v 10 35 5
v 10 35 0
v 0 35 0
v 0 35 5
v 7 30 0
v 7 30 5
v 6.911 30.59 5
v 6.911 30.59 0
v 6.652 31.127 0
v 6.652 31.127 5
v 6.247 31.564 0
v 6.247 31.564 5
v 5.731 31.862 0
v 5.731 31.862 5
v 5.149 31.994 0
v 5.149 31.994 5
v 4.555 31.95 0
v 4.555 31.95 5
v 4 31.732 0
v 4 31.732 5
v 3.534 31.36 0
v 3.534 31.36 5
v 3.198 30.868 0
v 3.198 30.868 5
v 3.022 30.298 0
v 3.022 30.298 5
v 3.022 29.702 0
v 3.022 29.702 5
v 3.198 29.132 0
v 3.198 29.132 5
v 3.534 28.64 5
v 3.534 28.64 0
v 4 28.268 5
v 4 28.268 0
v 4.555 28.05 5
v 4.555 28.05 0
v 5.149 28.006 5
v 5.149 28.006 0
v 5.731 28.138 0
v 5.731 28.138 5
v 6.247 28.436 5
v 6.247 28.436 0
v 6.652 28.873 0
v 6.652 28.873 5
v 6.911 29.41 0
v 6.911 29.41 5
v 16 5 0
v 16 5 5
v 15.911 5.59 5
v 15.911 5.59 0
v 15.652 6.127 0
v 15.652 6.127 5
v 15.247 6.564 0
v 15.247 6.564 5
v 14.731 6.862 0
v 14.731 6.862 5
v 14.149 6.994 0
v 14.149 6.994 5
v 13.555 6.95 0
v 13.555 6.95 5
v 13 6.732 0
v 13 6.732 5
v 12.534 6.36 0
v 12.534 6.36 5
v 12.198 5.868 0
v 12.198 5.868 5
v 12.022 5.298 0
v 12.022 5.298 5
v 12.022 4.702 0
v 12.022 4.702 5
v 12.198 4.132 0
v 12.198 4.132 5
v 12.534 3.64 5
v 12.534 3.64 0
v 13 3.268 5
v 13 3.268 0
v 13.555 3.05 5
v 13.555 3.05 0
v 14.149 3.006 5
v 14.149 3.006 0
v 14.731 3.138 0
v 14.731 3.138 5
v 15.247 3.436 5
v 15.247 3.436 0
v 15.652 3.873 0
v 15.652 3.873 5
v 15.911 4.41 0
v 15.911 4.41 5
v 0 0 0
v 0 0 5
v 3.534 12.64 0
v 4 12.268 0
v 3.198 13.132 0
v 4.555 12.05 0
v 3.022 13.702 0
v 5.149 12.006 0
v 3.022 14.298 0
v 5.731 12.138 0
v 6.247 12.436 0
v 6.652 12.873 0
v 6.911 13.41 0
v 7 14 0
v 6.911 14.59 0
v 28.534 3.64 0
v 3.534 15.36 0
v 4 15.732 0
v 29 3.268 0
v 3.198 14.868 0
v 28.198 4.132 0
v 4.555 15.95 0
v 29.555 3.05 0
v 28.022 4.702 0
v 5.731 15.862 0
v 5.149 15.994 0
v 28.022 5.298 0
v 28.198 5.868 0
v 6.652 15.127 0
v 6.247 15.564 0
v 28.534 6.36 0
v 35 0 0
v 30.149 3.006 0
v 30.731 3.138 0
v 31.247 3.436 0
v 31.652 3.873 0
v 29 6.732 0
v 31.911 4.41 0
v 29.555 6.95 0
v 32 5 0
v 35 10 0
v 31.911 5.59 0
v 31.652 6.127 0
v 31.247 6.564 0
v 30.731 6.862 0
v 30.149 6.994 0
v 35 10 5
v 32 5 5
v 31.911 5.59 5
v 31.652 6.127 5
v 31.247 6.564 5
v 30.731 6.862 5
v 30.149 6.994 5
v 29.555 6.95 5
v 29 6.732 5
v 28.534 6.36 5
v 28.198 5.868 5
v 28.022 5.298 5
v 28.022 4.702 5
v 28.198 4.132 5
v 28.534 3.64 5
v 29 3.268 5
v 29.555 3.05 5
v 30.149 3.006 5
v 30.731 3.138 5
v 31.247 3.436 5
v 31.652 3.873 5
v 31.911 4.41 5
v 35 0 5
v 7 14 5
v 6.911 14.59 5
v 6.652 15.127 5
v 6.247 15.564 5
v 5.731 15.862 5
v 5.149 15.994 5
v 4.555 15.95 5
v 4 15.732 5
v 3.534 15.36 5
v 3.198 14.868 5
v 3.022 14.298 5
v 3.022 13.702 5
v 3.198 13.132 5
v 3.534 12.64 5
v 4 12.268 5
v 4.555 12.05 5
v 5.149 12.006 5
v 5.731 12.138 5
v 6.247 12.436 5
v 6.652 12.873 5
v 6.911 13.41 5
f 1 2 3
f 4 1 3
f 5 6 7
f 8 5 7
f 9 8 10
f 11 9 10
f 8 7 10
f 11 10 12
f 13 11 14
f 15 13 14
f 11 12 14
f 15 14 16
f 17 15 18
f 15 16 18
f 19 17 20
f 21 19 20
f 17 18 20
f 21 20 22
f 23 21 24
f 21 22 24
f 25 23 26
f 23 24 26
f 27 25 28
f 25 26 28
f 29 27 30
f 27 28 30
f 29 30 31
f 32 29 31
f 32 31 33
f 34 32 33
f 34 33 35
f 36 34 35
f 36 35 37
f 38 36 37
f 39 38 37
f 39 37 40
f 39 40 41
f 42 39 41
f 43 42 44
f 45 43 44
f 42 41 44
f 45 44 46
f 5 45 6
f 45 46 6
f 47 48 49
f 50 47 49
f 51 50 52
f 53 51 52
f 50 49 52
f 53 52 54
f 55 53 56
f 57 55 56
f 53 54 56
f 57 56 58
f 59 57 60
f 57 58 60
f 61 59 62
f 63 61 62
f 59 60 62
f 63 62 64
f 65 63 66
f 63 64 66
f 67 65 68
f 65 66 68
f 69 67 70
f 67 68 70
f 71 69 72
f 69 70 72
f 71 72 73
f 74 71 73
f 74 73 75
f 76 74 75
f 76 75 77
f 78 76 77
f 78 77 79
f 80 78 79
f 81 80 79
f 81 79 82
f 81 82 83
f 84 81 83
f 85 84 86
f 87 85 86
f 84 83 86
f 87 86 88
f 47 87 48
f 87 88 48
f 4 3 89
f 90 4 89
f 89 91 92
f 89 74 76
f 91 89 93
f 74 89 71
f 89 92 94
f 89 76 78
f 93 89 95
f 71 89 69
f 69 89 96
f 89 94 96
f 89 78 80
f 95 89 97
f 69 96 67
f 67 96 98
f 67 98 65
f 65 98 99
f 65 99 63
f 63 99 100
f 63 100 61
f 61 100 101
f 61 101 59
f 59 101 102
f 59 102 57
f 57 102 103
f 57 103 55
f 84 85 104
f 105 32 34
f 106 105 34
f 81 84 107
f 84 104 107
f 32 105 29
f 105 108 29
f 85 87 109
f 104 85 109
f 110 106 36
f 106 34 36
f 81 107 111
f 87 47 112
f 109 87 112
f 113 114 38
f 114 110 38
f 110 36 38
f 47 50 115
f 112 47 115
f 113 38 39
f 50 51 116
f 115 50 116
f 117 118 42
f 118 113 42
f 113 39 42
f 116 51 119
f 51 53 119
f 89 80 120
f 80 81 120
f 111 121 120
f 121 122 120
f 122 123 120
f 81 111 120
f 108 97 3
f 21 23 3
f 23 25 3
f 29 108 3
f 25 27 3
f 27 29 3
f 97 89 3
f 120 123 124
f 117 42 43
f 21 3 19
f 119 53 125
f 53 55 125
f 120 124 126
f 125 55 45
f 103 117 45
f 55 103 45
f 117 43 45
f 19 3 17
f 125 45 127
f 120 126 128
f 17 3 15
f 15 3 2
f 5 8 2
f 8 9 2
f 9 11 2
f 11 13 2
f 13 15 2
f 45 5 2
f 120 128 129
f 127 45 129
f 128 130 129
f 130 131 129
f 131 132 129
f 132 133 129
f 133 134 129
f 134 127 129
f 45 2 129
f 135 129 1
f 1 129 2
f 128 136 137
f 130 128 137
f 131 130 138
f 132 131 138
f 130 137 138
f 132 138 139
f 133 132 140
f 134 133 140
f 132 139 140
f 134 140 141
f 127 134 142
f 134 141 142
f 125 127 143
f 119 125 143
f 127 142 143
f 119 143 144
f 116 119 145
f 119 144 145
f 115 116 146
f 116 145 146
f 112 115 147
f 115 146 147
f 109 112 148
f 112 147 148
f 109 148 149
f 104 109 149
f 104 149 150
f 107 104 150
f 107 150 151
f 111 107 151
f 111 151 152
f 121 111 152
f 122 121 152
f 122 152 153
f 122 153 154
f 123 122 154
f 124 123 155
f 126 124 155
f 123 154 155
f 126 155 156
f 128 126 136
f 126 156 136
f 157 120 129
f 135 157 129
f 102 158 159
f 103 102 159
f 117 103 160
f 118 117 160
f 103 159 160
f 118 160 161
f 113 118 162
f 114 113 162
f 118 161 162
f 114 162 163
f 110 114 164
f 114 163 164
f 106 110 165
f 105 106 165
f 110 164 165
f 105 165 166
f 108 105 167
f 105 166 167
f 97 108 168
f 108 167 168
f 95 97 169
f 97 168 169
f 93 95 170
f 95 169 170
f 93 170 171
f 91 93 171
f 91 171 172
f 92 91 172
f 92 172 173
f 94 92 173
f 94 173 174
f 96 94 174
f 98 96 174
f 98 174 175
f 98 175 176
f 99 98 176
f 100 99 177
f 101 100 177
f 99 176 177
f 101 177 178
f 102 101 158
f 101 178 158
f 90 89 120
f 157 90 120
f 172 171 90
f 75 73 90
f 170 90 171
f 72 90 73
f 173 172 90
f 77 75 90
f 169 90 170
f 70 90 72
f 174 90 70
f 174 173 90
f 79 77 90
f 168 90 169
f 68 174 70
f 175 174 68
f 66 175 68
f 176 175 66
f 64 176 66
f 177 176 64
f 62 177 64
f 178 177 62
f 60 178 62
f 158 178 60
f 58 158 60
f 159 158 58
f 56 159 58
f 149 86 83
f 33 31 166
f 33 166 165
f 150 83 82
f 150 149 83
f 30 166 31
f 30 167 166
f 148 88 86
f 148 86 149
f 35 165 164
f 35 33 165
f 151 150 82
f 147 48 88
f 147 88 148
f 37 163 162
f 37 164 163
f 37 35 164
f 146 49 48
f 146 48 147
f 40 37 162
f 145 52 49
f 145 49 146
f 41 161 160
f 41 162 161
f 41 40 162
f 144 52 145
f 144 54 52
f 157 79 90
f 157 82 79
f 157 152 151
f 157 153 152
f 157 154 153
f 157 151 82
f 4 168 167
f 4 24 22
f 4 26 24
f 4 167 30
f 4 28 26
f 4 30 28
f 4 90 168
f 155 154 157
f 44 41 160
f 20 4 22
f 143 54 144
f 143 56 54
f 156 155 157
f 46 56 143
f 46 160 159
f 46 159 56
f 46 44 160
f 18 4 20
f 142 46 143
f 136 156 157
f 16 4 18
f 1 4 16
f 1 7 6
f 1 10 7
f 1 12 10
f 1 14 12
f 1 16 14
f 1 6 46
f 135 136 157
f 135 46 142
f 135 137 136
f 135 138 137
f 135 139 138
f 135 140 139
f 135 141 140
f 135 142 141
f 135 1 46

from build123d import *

# Parameters (mm, degrees)
BOSS_EXTRU_1_DEPTH      = 5
ESQUISSE2_R             = 2
ENL_V_MAT_EXTRU_1_DEPTH = 5


with BuildPart() as part:
    # Esquisse1 → Boss.-Extru.1 (new body)
    with BuildSketch(Plane.XY):
        Polygon((0, 0), (35, 0), (35, 10), (10, 35), (0, 35), align=None)
    extrude(amount=BOSS_EXTRU_1_DEPTH)

    # Esquisse2 → Enlèv. mat.-Extru.1 (cut)
    with BuildSketch(Plane.XY.offset(5)):
        with Locations((14, 5)):
            Circle(ESQUISSE2_R)
        with Locations((30, 5)):
            Circle(ESQUISSE2_R)
        with Locations((5, 30)):
            Circle(ESQUISSE2_R)
        with Locations((5, 14)):
            Circle(ESQUISSE2_R)
    extrude(amount=-ENL_V_MAT_EXTRU_1_DEPTH, mode=Mode.SUBTRACT)


solid = part.part
